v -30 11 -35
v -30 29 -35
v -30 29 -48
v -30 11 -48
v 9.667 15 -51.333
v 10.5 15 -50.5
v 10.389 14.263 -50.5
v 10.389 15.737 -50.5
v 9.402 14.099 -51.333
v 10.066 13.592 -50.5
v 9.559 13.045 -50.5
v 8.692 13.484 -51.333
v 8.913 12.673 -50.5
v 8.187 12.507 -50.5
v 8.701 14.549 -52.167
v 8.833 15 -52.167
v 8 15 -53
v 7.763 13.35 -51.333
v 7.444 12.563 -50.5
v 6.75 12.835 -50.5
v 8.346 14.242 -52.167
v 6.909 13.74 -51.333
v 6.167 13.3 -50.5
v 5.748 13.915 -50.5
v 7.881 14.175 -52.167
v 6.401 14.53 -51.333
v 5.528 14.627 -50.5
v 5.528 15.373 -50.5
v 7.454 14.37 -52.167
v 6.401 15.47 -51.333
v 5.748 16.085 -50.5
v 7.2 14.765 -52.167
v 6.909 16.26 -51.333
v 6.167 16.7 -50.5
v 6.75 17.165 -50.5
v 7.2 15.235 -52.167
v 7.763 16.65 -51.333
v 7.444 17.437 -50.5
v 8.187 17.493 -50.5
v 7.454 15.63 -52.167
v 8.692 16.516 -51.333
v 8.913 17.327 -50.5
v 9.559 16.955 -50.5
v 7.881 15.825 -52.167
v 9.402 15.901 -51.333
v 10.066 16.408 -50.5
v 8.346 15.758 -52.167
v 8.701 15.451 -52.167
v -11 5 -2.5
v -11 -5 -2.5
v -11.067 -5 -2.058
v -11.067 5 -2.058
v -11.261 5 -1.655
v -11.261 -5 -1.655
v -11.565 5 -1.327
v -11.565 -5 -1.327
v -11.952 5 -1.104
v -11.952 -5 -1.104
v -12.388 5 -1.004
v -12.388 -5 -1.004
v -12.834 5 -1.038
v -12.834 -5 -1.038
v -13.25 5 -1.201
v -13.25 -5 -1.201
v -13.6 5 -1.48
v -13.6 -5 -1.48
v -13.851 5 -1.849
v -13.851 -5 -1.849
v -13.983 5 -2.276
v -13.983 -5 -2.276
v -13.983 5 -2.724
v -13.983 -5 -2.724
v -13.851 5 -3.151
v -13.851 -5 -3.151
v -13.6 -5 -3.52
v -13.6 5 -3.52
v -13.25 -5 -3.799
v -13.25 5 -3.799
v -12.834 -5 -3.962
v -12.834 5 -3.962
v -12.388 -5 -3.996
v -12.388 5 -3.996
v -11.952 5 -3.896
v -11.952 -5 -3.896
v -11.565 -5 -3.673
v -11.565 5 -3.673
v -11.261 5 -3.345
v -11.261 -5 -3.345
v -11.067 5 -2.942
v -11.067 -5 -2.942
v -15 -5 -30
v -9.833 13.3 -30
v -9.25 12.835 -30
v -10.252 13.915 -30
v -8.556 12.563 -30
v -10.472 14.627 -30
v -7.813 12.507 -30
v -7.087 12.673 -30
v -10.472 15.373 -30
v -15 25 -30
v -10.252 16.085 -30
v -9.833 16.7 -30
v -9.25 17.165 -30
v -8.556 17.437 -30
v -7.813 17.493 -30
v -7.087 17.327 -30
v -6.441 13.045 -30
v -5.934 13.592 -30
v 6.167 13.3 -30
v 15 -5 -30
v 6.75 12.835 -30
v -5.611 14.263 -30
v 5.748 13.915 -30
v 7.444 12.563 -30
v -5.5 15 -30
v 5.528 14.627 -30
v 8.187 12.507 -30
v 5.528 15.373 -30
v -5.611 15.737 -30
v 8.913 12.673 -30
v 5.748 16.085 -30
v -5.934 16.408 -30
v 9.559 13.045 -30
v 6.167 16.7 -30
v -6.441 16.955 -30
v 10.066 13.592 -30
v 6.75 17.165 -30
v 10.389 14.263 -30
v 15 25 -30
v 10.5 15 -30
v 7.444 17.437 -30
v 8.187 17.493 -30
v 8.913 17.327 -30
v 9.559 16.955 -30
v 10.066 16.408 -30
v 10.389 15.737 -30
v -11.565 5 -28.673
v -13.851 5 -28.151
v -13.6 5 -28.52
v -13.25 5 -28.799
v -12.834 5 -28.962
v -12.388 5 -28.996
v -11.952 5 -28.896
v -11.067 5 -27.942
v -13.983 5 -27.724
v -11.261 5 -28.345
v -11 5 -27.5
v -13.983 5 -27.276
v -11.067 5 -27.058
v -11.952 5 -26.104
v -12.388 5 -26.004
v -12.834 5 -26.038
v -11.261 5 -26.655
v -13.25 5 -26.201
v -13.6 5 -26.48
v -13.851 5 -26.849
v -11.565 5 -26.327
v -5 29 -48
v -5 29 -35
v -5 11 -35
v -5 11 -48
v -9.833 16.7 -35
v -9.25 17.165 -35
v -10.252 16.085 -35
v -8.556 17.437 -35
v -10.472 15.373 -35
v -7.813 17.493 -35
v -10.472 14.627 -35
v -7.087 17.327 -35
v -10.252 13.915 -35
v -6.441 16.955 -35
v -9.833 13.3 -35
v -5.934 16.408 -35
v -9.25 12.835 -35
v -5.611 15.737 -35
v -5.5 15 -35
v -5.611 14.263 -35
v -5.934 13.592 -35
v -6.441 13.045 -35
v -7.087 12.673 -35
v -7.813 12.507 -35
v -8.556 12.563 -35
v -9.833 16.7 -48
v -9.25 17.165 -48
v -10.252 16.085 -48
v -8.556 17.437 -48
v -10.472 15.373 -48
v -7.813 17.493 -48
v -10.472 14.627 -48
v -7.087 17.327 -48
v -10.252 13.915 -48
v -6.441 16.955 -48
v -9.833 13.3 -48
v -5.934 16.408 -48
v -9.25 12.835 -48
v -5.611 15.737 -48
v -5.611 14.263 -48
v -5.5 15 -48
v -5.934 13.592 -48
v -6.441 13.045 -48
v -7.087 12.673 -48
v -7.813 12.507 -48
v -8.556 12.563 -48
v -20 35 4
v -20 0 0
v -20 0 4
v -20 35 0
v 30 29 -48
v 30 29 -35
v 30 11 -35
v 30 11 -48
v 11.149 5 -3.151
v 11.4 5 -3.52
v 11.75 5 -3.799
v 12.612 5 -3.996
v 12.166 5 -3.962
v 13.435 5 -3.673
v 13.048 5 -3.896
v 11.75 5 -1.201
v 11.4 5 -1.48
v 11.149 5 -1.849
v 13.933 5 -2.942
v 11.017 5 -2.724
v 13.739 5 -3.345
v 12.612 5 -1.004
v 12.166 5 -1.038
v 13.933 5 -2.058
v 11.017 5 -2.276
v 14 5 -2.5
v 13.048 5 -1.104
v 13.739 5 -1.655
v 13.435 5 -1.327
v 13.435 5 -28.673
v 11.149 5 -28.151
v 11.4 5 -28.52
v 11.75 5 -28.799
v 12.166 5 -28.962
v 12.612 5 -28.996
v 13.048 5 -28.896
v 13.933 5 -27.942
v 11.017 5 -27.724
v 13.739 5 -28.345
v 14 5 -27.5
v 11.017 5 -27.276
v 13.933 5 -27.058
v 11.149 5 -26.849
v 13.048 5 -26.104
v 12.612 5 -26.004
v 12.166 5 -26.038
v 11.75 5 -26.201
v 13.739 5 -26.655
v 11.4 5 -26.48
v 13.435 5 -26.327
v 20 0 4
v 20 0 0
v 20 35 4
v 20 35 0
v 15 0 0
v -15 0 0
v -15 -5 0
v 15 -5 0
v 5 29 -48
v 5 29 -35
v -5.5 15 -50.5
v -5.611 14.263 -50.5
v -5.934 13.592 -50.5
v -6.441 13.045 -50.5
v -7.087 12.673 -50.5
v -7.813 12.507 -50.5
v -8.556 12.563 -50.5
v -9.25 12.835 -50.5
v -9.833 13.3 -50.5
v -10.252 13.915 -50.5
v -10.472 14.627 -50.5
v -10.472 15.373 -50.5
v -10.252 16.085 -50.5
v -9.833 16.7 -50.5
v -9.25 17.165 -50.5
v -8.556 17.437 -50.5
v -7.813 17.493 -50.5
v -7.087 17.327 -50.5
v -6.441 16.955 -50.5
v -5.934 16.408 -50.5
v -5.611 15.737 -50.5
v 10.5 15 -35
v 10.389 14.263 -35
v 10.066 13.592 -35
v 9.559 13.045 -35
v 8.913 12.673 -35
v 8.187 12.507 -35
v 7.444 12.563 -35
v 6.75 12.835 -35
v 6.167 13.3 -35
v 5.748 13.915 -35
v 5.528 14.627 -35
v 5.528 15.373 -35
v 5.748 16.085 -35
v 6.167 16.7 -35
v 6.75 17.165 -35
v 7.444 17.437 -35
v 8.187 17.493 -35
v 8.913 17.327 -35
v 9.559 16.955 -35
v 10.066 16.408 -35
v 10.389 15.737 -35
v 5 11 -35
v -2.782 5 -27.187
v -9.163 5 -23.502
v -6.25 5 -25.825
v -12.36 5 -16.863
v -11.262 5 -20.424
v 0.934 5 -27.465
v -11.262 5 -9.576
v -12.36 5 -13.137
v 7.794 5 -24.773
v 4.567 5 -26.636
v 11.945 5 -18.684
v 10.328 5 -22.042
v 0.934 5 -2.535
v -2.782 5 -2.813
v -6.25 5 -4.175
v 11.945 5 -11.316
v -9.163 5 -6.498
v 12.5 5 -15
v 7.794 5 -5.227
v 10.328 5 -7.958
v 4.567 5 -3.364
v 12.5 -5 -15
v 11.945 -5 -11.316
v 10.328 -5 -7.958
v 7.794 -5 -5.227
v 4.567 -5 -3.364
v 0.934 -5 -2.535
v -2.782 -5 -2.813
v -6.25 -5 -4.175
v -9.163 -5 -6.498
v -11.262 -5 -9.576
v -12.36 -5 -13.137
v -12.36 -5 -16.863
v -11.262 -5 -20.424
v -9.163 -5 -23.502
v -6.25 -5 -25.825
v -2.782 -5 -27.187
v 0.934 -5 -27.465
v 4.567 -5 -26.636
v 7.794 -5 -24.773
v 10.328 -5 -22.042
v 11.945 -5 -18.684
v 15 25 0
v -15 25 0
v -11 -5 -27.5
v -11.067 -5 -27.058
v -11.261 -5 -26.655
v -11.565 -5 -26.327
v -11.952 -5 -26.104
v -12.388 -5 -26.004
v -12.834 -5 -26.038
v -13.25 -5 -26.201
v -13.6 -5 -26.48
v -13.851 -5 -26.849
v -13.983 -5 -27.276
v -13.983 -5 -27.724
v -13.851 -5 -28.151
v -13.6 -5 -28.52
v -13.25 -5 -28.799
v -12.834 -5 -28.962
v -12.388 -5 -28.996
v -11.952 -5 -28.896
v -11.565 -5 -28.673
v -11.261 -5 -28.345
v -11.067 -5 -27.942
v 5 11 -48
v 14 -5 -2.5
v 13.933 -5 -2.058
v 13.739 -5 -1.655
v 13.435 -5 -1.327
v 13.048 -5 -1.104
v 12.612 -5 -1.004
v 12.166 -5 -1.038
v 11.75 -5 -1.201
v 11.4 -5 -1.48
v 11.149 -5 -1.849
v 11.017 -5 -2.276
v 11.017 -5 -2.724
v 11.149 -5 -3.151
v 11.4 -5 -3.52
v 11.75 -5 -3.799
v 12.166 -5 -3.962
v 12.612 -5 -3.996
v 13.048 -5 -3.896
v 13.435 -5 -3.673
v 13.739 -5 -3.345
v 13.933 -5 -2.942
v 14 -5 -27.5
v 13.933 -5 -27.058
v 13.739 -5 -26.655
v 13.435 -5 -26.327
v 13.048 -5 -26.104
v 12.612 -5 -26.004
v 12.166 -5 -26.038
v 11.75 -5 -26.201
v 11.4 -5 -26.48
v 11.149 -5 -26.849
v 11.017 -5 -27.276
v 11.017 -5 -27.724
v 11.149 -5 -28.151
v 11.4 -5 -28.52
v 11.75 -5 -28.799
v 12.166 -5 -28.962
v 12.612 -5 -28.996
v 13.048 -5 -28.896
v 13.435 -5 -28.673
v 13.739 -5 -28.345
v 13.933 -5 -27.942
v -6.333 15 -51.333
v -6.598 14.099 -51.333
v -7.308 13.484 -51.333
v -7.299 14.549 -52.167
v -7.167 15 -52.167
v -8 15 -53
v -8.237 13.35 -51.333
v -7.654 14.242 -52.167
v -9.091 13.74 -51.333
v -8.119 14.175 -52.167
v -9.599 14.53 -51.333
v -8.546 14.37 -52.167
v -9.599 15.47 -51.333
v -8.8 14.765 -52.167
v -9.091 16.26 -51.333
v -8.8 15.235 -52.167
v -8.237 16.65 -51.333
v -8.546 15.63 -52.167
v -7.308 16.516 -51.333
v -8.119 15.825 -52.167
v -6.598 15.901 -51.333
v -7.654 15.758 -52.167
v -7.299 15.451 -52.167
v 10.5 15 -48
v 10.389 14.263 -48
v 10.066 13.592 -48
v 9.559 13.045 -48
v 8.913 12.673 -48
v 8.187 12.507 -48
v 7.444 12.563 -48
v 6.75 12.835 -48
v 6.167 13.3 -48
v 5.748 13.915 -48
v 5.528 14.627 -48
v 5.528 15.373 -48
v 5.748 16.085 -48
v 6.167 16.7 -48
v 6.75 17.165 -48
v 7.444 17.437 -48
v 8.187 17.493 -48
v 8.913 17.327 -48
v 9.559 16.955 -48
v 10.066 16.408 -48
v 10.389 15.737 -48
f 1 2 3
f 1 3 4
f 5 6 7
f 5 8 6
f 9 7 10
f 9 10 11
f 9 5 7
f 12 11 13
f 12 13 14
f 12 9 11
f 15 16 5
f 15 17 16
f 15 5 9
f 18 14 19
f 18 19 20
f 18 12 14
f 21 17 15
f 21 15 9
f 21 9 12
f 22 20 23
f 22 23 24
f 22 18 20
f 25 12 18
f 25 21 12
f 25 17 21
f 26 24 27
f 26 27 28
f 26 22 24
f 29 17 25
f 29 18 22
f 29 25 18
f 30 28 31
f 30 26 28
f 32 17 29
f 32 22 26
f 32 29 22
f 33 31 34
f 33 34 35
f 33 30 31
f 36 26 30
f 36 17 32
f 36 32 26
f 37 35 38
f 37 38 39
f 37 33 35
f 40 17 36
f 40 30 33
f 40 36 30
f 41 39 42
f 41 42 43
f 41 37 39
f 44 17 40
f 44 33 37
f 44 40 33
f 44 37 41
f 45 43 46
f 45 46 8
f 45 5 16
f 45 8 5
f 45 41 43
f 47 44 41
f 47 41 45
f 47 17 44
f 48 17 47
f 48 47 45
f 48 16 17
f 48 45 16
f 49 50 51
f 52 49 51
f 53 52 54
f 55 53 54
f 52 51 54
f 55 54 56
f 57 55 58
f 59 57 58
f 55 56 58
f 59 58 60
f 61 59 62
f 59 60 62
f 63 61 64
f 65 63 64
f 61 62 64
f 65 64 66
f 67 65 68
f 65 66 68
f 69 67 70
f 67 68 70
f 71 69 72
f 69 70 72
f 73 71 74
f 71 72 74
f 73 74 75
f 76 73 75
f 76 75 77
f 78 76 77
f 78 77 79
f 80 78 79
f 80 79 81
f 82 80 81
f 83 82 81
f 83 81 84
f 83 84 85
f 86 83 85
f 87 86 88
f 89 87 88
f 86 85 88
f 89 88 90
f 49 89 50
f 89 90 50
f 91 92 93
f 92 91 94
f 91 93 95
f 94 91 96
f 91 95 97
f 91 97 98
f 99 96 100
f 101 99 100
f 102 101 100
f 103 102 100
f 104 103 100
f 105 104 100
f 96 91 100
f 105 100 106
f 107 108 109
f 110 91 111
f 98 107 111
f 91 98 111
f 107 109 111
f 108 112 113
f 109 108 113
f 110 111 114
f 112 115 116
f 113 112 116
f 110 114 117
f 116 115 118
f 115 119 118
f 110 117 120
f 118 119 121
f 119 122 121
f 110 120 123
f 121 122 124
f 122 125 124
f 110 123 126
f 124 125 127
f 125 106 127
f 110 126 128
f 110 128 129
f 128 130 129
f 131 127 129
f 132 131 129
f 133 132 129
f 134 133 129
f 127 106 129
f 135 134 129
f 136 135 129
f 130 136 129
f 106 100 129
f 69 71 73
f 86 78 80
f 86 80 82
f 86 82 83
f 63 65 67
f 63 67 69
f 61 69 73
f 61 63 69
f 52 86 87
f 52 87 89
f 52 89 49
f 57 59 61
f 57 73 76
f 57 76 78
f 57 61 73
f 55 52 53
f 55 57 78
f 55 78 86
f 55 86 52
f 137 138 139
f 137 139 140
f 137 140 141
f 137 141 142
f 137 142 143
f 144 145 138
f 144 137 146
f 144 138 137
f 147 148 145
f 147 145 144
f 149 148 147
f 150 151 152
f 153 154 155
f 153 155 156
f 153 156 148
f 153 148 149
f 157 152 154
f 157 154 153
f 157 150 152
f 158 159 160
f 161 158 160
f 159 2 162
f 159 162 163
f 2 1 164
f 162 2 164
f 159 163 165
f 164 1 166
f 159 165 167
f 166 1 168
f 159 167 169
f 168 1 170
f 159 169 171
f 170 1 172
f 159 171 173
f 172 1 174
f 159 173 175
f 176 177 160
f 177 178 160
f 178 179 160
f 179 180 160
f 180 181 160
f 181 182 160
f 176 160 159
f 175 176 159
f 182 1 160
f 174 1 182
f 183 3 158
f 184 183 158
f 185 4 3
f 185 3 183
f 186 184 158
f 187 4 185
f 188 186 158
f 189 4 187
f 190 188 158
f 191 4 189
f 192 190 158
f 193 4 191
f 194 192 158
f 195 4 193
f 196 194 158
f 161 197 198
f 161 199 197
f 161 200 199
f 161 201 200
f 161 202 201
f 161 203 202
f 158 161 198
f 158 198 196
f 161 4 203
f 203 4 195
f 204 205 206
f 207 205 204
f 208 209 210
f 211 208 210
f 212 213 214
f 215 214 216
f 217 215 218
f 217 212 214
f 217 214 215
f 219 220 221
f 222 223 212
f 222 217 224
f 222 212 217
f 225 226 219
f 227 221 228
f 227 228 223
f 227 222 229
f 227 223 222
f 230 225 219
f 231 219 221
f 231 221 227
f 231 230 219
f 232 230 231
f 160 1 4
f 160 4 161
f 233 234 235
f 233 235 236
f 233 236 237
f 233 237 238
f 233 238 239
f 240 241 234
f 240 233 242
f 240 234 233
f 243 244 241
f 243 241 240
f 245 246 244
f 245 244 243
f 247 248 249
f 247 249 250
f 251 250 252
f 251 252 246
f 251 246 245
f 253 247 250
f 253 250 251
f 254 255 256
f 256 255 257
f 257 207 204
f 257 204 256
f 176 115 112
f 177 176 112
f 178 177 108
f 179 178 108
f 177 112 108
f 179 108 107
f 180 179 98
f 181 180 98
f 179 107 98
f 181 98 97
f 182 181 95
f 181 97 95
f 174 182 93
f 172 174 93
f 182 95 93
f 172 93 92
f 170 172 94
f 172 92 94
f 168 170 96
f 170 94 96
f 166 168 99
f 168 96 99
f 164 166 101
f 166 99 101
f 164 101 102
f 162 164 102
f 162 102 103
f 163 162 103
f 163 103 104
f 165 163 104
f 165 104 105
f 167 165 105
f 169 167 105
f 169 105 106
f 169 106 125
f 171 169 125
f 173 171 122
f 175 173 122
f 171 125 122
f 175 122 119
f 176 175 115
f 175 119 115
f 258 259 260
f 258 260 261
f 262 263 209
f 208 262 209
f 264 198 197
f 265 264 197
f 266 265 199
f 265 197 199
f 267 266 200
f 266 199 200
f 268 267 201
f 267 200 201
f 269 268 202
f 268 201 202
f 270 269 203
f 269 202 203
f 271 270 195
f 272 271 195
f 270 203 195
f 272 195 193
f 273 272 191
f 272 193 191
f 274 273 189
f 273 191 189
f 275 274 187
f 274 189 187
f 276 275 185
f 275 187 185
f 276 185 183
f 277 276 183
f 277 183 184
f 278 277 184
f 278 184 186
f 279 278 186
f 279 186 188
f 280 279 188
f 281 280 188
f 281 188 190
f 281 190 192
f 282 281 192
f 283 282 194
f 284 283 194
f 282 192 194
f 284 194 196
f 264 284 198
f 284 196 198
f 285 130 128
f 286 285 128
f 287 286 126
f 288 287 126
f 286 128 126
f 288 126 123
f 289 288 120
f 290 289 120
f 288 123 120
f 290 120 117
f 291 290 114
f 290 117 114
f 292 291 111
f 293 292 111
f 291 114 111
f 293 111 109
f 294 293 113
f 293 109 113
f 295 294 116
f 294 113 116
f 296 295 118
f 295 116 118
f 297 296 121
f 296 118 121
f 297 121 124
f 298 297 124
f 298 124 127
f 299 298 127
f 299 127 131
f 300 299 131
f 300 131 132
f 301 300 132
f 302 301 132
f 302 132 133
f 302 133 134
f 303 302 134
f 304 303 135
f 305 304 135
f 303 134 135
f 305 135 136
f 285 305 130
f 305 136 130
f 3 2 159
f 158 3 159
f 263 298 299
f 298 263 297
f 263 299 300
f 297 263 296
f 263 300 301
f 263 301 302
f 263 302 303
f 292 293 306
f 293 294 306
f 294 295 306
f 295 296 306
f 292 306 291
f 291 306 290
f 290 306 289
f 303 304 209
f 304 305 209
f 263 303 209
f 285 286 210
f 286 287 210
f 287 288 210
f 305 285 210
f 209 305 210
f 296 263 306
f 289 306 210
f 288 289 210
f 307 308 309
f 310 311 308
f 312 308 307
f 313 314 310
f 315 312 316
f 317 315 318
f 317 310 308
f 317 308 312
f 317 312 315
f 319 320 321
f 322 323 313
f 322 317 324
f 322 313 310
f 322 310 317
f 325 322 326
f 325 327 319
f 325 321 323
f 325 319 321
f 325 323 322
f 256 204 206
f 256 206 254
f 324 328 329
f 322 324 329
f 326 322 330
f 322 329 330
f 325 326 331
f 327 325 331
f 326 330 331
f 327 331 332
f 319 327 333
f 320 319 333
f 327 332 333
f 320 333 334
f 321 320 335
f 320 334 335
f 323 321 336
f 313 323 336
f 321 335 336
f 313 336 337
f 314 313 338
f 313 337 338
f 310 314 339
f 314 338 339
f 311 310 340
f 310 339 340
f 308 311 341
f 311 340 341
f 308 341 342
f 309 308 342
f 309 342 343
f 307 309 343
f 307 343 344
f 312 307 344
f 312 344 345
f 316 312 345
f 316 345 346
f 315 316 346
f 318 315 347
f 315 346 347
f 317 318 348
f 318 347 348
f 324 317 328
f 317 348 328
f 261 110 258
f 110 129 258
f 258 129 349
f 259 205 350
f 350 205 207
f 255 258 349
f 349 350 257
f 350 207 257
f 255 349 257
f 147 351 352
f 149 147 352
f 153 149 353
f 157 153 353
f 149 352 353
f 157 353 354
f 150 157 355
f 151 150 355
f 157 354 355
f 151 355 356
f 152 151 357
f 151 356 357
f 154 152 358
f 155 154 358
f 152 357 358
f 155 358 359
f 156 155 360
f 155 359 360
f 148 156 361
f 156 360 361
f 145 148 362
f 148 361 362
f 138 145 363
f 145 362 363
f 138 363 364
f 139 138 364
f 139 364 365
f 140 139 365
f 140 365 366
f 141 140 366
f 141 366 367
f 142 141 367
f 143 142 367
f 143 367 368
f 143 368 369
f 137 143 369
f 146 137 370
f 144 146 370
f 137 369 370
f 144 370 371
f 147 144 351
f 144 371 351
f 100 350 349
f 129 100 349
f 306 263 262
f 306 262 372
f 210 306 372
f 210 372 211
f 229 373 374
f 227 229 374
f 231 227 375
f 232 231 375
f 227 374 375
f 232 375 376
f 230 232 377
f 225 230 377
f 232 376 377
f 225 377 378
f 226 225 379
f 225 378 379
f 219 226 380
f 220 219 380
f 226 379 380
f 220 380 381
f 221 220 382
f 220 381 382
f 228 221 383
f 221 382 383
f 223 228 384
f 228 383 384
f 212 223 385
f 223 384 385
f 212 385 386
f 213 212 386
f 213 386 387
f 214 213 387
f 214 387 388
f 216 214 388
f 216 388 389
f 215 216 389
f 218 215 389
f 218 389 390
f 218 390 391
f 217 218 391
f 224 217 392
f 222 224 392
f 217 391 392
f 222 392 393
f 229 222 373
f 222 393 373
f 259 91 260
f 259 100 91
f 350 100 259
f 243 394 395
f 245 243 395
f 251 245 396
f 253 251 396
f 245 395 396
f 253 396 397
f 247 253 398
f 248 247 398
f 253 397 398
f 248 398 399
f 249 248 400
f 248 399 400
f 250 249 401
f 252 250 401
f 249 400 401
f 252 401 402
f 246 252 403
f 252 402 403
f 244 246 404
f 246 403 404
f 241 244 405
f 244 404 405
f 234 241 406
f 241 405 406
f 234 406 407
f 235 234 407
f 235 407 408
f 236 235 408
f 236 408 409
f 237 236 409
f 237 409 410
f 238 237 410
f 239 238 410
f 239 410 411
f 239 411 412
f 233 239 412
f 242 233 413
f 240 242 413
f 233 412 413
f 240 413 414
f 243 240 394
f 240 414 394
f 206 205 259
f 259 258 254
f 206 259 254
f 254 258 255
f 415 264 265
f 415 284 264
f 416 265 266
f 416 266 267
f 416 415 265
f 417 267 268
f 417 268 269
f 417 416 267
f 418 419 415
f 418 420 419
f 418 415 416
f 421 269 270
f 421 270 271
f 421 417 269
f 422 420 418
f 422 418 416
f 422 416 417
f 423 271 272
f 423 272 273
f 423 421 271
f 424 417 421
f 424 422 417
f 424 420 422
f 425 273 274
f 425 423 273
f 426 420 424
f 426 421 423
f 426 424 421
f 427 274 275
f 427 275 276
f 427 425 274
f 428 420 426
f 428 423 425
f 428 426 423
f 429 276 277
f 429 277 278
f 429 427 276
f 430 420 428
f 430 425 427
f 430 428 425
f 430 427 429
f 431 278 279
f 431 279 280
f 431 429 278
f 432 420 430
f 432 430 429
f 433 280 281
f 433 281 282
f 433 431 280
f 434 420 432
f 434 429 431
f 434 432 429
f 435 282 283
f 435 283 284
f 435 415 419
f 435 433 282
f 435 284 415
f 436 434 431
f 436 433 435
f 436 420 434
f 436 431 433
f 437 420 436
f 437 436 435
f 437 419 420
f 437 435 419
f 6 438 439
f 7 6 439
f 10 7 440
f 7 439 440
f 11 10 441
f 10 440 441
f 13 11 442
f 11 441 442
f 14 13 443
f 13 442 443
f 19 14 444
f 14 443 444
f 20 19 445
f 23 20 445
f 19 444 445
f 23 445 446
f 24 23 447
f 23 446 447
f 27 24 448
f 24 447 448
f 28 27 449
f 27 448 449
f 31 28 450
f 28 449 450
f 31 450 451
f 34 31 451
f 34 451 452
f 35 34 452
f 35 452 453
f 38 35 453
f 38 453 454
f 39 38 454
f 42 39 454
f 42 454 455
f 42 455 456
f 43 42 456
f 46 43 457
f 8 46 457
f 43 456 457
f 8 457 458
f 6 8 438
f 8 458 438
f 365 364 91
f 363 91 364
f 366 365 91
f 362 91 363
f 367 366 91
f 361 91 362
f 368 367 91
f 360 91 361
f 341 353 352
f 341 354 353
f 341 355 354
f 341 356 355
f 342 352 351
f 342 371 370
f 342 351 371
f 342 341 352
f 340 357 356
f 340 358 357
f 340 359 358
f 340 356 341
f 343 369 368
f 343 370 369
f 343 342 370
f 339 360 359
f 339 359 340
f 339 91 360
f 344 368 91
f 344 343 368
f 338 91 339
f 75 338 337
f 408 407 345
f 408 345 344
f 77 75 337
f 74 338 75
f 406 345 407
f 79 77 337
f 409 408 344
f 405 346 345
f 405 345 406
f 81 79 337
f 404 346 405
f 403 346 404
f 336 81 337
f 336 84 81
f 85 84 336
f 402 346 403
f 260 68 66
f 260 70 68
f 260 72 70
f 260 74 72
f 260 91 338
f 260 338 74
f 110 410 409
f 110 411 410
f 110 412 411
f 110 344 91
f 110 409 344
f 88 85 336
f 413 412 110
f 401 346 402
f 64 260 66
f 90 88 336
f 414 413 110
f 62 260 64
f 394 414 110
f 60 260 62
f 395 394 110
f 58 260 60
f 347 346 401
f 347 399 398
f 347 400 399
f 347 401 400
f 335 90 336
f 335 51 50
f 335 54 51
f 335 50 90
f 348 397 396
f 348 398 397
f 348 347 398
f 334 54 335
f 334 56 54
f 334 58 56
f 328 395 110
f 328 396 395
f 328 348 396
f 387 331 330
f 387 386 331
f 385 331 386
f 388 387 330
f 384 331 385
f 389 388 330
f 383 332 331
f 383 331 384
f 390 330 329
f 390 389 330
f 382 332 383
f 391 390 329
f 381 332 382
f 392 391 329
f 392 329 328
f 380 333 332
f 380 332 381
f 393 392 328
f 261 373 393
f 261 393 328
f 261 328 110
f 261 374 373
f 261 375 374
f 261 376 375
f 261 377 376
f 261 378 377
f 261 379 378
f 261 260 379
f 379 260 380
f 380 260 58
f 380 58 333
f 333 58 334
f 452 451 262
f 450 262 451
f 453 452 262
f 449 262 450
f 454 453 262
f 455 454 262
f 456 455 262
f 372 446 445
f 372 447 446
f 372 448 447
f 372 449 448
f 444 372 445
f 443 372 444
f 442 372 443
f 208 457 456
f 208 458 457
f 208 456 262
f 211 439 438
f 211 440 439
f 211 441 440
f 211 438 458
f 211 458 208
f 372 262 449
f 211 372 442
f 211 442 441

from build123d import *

# Parameters (mm, degrees)
F0_W      = 40
F0_H      = 35
F1_DEPTH  = 4
F2_W      = 30
F2_H      = 20
F3_DEPTH  = 30
F4_W      = 30
F4_H      = 30
F5_DEPTH  = 10
F6_R      = 1.5
F6_R_2    = 12.5
F7_DEPTH  = 10
F8_R      = 2.5
F9_DEPTH  = 5
F10_W     = 25
F10_H     = 18
F11_DEPTH = 13
F12_R     = 2.5
F13_DEPTH = 5
F14_SIZE  = 2.5


with BuildPart() as f1:
    # F0 (on Top) → F1 (new body)
    with BuildSketch(Plane.XY):
        with Locations((0, 17.5)):
            Rectangle(F0_W, F0_H)
    extrude(amount=F1_DEPTH)



with BuildPart() as f3:
    # F2 (on face) → F3 (new body)
    with BuildSketch(Plane(origin=(0, 0, 0), x_dir=(1, 0, 0), z_dir=(0, 0, -1))):
        with Locations((0, -15)):
            Rectangle(F2_W, F2_H)
    extrude(amount=F3_DEPTH)

    # F8 (on face) → F9 (join)
    with BuildSketch(Plane(origin=(0, 0, -30), x_dir=(1, 0, 0), z_dir=(0, 0, -1))):
        with Locations((-8, -15)):
            Circle(F8_R)
        with Locations((8, -15)):
            Circle(F8_R)
    extrude(amount=F9_DEPTH)

    # F10 (on face) → F11 (join)
    with BuildSketch(Plane(origin=(0, 0, -35), x_dir=(1, 0, 0), z_dir=(0, 0, -1))):
        with Locations((17.5, -20)):
            Rectangle(F10_W, F10_H)
        with Locations((-17.5, -20)):
            Rectangle(F10_W, F10_H)
    extrude(amount=F11_DEPTH)


with BuildPart() as f5:
    # F4 (on face) → F5 (new body)
    with BuildSketch(Plane.XZ.offset(-5)):
        with Locations((0, -15)):
            Rectangle(F4_W, F4_H)
    extrude(amount=F5_DEPTH)

    # F6 (on face) → F7 (cut, through all)
    with BuildSketch(Plane.XZ.offset(5)):
        with Locations((-12.5, -2.5)):
            Circle(F6_R)
        with Locations((0, -15)):
            Circle(F6_R_2)
        with Locations((12.5, -2.5)):
            Circle(F6_R)
        with Locations((-12.5, -27.5)):
            Circle(F6_R)
        with Locations((12.5, -27.5)):
            Circle(F6_R)
    extrude(amount=-F7_DEPTH, mode=Mode.SUBTRACT)


with BuildPart() as f1_1:
    add(f1.part)

    add(f3.part)  # F13 merges F3

    add(f5.part)  # F13 merges F5
    # F12 (on face) → F13 (join)
    with BuildSketch(Plane(origin=(0, 0, -48), x_dir=(1, 0, 0), z_dir=(0, 0, -1))):
        with Locations((8, -15)):
            Circle(F12_R)
        with Locations((-8, -15)):
            Circle(F12_R)
    extrude(amount=F13_DEPTH)

    # F14
    f14_edges = [f1_1.edges().sort_by_distance(p)[0] for p in [
        (-10.5, 15, -53),
        (5.5, 15, -53),
    ]]
    chamfer(f14_edges, length=F14_SIZE)


solid = f1_1.part
